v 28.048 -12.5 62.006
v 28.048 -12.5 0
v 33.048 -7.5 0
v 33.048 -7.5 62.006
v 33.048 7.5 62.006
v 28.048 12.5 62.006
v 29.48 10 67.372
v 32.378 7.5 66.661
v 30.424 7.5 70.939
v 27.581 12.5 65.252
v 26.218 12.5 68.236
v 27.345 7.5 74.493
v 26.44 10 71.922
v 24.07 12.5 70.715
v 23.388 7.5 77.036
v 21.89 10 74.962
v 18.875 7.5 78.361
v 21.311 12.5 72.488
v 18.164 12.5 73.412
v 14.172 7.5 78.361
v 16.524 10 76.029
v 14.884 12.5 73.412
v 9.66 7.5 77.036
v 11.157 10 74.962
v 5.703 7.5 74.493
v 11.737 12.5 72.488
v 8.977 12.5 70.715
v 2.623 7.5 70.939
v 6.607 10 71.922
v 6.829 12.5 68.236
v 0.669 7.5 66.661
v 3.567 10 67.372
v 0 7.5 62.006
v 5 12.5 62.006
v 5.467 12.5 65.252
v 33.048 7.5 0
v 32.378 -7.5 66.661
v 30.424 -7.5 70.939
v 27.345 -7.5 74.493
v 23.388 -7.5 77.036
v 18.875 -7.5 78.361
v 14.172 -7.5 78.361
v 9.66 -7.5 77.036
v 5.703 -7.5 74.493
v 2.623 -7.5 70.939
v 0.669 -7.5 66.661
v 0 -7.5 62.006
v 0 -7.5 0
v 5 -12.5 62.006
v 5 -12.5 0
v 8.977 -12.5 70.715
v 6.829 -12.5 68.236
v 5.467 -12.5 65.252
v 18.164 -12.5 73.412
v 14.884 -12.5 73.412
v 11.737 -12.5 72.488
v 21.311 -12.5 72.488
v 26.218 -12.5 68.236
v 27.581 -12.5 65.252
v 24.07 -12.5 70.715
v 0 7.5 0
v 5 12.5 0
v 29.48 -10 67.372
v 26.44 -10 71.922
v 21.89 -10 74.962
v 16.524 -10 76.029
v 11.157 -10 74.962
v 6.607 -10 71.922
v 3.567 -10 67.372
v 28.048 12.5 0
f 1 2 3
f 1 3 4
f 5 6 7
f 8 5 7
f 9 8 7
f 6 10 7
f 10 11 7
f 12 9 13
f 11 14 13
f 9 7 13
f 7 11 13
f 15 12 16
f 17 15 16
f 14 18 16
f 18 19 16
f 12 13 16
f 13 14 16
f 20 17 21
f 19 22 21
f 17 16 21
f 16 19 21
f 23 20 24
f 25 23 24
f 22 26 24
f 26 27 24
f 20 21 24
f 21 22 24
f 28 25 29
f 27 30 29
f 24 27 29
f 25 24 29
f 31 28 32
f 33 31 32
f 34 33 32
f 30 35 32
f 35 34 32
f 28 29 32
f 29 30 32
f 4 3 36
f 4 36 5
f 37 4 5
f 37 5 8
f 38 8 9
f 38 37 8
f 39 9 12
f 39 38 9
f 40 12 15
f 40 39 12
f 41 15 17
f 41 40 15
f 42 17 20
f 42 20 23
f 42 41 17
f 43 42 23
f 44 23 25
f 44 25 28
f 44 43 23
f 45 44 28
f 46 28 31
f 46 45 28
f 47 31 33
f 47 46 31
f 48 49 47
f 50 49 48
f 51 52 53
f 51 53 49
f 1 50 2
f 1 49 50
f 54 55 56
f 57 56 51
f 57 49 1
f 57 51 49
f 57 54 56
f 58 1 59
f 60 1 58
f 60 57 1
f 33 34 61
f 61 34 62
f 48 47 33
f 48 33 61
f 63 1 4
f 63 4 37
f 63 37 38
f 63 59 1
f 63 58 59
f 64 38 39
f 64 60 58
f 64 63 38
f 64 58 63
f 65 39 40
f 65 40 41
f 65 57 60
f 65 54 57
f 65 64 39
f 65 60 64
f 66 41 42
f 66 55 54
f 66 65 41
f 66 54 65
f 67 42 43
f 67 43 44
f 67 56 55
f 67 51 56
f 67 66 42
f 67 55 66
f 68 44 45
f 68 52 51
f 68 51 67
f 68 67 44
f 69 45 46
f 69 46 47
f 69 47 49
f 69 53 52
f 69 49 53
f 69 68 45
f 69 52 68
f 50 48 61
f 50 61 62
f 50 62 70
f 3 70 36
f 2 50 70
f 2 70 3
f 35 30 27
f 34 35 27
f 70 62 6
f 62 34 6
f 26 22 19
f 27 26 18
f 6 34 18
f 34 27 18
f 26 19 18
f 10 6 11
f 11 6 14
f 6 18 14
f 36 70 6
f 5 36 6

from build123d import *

# Parameters (mm, degrees)
F1_DEPTH = 12.5
F2_SIZE  = 5


with BuildPart() as f1:
    # F0 (on Front) → F1 (new body, symmetric)
    with BuildSketch(Plane.XZ):
        with BuildLine():
            Line((0, 62.005542), (0, 0))
            Line((0, 0), (33.04759, 0))
            Line((33.04759, 0), (33.04759, 62.005542))
            ThreePointArc((33.04759, 62.005542), (16.523795, 78.529337), (0, 62.005542))
        make_face()
    extrude(amount=F1_DEPTH, both=True)

    # F2
    f2_edges = [f1.edges().sort_by_distance(p)[0] for p in [
        (16.523795, -12.5, 78.529337),
        (16.523795, 12.5, 78.529337),
    ]]
    chamfer(f2_edges, length=F2_SIZE)


solid = f1.part
